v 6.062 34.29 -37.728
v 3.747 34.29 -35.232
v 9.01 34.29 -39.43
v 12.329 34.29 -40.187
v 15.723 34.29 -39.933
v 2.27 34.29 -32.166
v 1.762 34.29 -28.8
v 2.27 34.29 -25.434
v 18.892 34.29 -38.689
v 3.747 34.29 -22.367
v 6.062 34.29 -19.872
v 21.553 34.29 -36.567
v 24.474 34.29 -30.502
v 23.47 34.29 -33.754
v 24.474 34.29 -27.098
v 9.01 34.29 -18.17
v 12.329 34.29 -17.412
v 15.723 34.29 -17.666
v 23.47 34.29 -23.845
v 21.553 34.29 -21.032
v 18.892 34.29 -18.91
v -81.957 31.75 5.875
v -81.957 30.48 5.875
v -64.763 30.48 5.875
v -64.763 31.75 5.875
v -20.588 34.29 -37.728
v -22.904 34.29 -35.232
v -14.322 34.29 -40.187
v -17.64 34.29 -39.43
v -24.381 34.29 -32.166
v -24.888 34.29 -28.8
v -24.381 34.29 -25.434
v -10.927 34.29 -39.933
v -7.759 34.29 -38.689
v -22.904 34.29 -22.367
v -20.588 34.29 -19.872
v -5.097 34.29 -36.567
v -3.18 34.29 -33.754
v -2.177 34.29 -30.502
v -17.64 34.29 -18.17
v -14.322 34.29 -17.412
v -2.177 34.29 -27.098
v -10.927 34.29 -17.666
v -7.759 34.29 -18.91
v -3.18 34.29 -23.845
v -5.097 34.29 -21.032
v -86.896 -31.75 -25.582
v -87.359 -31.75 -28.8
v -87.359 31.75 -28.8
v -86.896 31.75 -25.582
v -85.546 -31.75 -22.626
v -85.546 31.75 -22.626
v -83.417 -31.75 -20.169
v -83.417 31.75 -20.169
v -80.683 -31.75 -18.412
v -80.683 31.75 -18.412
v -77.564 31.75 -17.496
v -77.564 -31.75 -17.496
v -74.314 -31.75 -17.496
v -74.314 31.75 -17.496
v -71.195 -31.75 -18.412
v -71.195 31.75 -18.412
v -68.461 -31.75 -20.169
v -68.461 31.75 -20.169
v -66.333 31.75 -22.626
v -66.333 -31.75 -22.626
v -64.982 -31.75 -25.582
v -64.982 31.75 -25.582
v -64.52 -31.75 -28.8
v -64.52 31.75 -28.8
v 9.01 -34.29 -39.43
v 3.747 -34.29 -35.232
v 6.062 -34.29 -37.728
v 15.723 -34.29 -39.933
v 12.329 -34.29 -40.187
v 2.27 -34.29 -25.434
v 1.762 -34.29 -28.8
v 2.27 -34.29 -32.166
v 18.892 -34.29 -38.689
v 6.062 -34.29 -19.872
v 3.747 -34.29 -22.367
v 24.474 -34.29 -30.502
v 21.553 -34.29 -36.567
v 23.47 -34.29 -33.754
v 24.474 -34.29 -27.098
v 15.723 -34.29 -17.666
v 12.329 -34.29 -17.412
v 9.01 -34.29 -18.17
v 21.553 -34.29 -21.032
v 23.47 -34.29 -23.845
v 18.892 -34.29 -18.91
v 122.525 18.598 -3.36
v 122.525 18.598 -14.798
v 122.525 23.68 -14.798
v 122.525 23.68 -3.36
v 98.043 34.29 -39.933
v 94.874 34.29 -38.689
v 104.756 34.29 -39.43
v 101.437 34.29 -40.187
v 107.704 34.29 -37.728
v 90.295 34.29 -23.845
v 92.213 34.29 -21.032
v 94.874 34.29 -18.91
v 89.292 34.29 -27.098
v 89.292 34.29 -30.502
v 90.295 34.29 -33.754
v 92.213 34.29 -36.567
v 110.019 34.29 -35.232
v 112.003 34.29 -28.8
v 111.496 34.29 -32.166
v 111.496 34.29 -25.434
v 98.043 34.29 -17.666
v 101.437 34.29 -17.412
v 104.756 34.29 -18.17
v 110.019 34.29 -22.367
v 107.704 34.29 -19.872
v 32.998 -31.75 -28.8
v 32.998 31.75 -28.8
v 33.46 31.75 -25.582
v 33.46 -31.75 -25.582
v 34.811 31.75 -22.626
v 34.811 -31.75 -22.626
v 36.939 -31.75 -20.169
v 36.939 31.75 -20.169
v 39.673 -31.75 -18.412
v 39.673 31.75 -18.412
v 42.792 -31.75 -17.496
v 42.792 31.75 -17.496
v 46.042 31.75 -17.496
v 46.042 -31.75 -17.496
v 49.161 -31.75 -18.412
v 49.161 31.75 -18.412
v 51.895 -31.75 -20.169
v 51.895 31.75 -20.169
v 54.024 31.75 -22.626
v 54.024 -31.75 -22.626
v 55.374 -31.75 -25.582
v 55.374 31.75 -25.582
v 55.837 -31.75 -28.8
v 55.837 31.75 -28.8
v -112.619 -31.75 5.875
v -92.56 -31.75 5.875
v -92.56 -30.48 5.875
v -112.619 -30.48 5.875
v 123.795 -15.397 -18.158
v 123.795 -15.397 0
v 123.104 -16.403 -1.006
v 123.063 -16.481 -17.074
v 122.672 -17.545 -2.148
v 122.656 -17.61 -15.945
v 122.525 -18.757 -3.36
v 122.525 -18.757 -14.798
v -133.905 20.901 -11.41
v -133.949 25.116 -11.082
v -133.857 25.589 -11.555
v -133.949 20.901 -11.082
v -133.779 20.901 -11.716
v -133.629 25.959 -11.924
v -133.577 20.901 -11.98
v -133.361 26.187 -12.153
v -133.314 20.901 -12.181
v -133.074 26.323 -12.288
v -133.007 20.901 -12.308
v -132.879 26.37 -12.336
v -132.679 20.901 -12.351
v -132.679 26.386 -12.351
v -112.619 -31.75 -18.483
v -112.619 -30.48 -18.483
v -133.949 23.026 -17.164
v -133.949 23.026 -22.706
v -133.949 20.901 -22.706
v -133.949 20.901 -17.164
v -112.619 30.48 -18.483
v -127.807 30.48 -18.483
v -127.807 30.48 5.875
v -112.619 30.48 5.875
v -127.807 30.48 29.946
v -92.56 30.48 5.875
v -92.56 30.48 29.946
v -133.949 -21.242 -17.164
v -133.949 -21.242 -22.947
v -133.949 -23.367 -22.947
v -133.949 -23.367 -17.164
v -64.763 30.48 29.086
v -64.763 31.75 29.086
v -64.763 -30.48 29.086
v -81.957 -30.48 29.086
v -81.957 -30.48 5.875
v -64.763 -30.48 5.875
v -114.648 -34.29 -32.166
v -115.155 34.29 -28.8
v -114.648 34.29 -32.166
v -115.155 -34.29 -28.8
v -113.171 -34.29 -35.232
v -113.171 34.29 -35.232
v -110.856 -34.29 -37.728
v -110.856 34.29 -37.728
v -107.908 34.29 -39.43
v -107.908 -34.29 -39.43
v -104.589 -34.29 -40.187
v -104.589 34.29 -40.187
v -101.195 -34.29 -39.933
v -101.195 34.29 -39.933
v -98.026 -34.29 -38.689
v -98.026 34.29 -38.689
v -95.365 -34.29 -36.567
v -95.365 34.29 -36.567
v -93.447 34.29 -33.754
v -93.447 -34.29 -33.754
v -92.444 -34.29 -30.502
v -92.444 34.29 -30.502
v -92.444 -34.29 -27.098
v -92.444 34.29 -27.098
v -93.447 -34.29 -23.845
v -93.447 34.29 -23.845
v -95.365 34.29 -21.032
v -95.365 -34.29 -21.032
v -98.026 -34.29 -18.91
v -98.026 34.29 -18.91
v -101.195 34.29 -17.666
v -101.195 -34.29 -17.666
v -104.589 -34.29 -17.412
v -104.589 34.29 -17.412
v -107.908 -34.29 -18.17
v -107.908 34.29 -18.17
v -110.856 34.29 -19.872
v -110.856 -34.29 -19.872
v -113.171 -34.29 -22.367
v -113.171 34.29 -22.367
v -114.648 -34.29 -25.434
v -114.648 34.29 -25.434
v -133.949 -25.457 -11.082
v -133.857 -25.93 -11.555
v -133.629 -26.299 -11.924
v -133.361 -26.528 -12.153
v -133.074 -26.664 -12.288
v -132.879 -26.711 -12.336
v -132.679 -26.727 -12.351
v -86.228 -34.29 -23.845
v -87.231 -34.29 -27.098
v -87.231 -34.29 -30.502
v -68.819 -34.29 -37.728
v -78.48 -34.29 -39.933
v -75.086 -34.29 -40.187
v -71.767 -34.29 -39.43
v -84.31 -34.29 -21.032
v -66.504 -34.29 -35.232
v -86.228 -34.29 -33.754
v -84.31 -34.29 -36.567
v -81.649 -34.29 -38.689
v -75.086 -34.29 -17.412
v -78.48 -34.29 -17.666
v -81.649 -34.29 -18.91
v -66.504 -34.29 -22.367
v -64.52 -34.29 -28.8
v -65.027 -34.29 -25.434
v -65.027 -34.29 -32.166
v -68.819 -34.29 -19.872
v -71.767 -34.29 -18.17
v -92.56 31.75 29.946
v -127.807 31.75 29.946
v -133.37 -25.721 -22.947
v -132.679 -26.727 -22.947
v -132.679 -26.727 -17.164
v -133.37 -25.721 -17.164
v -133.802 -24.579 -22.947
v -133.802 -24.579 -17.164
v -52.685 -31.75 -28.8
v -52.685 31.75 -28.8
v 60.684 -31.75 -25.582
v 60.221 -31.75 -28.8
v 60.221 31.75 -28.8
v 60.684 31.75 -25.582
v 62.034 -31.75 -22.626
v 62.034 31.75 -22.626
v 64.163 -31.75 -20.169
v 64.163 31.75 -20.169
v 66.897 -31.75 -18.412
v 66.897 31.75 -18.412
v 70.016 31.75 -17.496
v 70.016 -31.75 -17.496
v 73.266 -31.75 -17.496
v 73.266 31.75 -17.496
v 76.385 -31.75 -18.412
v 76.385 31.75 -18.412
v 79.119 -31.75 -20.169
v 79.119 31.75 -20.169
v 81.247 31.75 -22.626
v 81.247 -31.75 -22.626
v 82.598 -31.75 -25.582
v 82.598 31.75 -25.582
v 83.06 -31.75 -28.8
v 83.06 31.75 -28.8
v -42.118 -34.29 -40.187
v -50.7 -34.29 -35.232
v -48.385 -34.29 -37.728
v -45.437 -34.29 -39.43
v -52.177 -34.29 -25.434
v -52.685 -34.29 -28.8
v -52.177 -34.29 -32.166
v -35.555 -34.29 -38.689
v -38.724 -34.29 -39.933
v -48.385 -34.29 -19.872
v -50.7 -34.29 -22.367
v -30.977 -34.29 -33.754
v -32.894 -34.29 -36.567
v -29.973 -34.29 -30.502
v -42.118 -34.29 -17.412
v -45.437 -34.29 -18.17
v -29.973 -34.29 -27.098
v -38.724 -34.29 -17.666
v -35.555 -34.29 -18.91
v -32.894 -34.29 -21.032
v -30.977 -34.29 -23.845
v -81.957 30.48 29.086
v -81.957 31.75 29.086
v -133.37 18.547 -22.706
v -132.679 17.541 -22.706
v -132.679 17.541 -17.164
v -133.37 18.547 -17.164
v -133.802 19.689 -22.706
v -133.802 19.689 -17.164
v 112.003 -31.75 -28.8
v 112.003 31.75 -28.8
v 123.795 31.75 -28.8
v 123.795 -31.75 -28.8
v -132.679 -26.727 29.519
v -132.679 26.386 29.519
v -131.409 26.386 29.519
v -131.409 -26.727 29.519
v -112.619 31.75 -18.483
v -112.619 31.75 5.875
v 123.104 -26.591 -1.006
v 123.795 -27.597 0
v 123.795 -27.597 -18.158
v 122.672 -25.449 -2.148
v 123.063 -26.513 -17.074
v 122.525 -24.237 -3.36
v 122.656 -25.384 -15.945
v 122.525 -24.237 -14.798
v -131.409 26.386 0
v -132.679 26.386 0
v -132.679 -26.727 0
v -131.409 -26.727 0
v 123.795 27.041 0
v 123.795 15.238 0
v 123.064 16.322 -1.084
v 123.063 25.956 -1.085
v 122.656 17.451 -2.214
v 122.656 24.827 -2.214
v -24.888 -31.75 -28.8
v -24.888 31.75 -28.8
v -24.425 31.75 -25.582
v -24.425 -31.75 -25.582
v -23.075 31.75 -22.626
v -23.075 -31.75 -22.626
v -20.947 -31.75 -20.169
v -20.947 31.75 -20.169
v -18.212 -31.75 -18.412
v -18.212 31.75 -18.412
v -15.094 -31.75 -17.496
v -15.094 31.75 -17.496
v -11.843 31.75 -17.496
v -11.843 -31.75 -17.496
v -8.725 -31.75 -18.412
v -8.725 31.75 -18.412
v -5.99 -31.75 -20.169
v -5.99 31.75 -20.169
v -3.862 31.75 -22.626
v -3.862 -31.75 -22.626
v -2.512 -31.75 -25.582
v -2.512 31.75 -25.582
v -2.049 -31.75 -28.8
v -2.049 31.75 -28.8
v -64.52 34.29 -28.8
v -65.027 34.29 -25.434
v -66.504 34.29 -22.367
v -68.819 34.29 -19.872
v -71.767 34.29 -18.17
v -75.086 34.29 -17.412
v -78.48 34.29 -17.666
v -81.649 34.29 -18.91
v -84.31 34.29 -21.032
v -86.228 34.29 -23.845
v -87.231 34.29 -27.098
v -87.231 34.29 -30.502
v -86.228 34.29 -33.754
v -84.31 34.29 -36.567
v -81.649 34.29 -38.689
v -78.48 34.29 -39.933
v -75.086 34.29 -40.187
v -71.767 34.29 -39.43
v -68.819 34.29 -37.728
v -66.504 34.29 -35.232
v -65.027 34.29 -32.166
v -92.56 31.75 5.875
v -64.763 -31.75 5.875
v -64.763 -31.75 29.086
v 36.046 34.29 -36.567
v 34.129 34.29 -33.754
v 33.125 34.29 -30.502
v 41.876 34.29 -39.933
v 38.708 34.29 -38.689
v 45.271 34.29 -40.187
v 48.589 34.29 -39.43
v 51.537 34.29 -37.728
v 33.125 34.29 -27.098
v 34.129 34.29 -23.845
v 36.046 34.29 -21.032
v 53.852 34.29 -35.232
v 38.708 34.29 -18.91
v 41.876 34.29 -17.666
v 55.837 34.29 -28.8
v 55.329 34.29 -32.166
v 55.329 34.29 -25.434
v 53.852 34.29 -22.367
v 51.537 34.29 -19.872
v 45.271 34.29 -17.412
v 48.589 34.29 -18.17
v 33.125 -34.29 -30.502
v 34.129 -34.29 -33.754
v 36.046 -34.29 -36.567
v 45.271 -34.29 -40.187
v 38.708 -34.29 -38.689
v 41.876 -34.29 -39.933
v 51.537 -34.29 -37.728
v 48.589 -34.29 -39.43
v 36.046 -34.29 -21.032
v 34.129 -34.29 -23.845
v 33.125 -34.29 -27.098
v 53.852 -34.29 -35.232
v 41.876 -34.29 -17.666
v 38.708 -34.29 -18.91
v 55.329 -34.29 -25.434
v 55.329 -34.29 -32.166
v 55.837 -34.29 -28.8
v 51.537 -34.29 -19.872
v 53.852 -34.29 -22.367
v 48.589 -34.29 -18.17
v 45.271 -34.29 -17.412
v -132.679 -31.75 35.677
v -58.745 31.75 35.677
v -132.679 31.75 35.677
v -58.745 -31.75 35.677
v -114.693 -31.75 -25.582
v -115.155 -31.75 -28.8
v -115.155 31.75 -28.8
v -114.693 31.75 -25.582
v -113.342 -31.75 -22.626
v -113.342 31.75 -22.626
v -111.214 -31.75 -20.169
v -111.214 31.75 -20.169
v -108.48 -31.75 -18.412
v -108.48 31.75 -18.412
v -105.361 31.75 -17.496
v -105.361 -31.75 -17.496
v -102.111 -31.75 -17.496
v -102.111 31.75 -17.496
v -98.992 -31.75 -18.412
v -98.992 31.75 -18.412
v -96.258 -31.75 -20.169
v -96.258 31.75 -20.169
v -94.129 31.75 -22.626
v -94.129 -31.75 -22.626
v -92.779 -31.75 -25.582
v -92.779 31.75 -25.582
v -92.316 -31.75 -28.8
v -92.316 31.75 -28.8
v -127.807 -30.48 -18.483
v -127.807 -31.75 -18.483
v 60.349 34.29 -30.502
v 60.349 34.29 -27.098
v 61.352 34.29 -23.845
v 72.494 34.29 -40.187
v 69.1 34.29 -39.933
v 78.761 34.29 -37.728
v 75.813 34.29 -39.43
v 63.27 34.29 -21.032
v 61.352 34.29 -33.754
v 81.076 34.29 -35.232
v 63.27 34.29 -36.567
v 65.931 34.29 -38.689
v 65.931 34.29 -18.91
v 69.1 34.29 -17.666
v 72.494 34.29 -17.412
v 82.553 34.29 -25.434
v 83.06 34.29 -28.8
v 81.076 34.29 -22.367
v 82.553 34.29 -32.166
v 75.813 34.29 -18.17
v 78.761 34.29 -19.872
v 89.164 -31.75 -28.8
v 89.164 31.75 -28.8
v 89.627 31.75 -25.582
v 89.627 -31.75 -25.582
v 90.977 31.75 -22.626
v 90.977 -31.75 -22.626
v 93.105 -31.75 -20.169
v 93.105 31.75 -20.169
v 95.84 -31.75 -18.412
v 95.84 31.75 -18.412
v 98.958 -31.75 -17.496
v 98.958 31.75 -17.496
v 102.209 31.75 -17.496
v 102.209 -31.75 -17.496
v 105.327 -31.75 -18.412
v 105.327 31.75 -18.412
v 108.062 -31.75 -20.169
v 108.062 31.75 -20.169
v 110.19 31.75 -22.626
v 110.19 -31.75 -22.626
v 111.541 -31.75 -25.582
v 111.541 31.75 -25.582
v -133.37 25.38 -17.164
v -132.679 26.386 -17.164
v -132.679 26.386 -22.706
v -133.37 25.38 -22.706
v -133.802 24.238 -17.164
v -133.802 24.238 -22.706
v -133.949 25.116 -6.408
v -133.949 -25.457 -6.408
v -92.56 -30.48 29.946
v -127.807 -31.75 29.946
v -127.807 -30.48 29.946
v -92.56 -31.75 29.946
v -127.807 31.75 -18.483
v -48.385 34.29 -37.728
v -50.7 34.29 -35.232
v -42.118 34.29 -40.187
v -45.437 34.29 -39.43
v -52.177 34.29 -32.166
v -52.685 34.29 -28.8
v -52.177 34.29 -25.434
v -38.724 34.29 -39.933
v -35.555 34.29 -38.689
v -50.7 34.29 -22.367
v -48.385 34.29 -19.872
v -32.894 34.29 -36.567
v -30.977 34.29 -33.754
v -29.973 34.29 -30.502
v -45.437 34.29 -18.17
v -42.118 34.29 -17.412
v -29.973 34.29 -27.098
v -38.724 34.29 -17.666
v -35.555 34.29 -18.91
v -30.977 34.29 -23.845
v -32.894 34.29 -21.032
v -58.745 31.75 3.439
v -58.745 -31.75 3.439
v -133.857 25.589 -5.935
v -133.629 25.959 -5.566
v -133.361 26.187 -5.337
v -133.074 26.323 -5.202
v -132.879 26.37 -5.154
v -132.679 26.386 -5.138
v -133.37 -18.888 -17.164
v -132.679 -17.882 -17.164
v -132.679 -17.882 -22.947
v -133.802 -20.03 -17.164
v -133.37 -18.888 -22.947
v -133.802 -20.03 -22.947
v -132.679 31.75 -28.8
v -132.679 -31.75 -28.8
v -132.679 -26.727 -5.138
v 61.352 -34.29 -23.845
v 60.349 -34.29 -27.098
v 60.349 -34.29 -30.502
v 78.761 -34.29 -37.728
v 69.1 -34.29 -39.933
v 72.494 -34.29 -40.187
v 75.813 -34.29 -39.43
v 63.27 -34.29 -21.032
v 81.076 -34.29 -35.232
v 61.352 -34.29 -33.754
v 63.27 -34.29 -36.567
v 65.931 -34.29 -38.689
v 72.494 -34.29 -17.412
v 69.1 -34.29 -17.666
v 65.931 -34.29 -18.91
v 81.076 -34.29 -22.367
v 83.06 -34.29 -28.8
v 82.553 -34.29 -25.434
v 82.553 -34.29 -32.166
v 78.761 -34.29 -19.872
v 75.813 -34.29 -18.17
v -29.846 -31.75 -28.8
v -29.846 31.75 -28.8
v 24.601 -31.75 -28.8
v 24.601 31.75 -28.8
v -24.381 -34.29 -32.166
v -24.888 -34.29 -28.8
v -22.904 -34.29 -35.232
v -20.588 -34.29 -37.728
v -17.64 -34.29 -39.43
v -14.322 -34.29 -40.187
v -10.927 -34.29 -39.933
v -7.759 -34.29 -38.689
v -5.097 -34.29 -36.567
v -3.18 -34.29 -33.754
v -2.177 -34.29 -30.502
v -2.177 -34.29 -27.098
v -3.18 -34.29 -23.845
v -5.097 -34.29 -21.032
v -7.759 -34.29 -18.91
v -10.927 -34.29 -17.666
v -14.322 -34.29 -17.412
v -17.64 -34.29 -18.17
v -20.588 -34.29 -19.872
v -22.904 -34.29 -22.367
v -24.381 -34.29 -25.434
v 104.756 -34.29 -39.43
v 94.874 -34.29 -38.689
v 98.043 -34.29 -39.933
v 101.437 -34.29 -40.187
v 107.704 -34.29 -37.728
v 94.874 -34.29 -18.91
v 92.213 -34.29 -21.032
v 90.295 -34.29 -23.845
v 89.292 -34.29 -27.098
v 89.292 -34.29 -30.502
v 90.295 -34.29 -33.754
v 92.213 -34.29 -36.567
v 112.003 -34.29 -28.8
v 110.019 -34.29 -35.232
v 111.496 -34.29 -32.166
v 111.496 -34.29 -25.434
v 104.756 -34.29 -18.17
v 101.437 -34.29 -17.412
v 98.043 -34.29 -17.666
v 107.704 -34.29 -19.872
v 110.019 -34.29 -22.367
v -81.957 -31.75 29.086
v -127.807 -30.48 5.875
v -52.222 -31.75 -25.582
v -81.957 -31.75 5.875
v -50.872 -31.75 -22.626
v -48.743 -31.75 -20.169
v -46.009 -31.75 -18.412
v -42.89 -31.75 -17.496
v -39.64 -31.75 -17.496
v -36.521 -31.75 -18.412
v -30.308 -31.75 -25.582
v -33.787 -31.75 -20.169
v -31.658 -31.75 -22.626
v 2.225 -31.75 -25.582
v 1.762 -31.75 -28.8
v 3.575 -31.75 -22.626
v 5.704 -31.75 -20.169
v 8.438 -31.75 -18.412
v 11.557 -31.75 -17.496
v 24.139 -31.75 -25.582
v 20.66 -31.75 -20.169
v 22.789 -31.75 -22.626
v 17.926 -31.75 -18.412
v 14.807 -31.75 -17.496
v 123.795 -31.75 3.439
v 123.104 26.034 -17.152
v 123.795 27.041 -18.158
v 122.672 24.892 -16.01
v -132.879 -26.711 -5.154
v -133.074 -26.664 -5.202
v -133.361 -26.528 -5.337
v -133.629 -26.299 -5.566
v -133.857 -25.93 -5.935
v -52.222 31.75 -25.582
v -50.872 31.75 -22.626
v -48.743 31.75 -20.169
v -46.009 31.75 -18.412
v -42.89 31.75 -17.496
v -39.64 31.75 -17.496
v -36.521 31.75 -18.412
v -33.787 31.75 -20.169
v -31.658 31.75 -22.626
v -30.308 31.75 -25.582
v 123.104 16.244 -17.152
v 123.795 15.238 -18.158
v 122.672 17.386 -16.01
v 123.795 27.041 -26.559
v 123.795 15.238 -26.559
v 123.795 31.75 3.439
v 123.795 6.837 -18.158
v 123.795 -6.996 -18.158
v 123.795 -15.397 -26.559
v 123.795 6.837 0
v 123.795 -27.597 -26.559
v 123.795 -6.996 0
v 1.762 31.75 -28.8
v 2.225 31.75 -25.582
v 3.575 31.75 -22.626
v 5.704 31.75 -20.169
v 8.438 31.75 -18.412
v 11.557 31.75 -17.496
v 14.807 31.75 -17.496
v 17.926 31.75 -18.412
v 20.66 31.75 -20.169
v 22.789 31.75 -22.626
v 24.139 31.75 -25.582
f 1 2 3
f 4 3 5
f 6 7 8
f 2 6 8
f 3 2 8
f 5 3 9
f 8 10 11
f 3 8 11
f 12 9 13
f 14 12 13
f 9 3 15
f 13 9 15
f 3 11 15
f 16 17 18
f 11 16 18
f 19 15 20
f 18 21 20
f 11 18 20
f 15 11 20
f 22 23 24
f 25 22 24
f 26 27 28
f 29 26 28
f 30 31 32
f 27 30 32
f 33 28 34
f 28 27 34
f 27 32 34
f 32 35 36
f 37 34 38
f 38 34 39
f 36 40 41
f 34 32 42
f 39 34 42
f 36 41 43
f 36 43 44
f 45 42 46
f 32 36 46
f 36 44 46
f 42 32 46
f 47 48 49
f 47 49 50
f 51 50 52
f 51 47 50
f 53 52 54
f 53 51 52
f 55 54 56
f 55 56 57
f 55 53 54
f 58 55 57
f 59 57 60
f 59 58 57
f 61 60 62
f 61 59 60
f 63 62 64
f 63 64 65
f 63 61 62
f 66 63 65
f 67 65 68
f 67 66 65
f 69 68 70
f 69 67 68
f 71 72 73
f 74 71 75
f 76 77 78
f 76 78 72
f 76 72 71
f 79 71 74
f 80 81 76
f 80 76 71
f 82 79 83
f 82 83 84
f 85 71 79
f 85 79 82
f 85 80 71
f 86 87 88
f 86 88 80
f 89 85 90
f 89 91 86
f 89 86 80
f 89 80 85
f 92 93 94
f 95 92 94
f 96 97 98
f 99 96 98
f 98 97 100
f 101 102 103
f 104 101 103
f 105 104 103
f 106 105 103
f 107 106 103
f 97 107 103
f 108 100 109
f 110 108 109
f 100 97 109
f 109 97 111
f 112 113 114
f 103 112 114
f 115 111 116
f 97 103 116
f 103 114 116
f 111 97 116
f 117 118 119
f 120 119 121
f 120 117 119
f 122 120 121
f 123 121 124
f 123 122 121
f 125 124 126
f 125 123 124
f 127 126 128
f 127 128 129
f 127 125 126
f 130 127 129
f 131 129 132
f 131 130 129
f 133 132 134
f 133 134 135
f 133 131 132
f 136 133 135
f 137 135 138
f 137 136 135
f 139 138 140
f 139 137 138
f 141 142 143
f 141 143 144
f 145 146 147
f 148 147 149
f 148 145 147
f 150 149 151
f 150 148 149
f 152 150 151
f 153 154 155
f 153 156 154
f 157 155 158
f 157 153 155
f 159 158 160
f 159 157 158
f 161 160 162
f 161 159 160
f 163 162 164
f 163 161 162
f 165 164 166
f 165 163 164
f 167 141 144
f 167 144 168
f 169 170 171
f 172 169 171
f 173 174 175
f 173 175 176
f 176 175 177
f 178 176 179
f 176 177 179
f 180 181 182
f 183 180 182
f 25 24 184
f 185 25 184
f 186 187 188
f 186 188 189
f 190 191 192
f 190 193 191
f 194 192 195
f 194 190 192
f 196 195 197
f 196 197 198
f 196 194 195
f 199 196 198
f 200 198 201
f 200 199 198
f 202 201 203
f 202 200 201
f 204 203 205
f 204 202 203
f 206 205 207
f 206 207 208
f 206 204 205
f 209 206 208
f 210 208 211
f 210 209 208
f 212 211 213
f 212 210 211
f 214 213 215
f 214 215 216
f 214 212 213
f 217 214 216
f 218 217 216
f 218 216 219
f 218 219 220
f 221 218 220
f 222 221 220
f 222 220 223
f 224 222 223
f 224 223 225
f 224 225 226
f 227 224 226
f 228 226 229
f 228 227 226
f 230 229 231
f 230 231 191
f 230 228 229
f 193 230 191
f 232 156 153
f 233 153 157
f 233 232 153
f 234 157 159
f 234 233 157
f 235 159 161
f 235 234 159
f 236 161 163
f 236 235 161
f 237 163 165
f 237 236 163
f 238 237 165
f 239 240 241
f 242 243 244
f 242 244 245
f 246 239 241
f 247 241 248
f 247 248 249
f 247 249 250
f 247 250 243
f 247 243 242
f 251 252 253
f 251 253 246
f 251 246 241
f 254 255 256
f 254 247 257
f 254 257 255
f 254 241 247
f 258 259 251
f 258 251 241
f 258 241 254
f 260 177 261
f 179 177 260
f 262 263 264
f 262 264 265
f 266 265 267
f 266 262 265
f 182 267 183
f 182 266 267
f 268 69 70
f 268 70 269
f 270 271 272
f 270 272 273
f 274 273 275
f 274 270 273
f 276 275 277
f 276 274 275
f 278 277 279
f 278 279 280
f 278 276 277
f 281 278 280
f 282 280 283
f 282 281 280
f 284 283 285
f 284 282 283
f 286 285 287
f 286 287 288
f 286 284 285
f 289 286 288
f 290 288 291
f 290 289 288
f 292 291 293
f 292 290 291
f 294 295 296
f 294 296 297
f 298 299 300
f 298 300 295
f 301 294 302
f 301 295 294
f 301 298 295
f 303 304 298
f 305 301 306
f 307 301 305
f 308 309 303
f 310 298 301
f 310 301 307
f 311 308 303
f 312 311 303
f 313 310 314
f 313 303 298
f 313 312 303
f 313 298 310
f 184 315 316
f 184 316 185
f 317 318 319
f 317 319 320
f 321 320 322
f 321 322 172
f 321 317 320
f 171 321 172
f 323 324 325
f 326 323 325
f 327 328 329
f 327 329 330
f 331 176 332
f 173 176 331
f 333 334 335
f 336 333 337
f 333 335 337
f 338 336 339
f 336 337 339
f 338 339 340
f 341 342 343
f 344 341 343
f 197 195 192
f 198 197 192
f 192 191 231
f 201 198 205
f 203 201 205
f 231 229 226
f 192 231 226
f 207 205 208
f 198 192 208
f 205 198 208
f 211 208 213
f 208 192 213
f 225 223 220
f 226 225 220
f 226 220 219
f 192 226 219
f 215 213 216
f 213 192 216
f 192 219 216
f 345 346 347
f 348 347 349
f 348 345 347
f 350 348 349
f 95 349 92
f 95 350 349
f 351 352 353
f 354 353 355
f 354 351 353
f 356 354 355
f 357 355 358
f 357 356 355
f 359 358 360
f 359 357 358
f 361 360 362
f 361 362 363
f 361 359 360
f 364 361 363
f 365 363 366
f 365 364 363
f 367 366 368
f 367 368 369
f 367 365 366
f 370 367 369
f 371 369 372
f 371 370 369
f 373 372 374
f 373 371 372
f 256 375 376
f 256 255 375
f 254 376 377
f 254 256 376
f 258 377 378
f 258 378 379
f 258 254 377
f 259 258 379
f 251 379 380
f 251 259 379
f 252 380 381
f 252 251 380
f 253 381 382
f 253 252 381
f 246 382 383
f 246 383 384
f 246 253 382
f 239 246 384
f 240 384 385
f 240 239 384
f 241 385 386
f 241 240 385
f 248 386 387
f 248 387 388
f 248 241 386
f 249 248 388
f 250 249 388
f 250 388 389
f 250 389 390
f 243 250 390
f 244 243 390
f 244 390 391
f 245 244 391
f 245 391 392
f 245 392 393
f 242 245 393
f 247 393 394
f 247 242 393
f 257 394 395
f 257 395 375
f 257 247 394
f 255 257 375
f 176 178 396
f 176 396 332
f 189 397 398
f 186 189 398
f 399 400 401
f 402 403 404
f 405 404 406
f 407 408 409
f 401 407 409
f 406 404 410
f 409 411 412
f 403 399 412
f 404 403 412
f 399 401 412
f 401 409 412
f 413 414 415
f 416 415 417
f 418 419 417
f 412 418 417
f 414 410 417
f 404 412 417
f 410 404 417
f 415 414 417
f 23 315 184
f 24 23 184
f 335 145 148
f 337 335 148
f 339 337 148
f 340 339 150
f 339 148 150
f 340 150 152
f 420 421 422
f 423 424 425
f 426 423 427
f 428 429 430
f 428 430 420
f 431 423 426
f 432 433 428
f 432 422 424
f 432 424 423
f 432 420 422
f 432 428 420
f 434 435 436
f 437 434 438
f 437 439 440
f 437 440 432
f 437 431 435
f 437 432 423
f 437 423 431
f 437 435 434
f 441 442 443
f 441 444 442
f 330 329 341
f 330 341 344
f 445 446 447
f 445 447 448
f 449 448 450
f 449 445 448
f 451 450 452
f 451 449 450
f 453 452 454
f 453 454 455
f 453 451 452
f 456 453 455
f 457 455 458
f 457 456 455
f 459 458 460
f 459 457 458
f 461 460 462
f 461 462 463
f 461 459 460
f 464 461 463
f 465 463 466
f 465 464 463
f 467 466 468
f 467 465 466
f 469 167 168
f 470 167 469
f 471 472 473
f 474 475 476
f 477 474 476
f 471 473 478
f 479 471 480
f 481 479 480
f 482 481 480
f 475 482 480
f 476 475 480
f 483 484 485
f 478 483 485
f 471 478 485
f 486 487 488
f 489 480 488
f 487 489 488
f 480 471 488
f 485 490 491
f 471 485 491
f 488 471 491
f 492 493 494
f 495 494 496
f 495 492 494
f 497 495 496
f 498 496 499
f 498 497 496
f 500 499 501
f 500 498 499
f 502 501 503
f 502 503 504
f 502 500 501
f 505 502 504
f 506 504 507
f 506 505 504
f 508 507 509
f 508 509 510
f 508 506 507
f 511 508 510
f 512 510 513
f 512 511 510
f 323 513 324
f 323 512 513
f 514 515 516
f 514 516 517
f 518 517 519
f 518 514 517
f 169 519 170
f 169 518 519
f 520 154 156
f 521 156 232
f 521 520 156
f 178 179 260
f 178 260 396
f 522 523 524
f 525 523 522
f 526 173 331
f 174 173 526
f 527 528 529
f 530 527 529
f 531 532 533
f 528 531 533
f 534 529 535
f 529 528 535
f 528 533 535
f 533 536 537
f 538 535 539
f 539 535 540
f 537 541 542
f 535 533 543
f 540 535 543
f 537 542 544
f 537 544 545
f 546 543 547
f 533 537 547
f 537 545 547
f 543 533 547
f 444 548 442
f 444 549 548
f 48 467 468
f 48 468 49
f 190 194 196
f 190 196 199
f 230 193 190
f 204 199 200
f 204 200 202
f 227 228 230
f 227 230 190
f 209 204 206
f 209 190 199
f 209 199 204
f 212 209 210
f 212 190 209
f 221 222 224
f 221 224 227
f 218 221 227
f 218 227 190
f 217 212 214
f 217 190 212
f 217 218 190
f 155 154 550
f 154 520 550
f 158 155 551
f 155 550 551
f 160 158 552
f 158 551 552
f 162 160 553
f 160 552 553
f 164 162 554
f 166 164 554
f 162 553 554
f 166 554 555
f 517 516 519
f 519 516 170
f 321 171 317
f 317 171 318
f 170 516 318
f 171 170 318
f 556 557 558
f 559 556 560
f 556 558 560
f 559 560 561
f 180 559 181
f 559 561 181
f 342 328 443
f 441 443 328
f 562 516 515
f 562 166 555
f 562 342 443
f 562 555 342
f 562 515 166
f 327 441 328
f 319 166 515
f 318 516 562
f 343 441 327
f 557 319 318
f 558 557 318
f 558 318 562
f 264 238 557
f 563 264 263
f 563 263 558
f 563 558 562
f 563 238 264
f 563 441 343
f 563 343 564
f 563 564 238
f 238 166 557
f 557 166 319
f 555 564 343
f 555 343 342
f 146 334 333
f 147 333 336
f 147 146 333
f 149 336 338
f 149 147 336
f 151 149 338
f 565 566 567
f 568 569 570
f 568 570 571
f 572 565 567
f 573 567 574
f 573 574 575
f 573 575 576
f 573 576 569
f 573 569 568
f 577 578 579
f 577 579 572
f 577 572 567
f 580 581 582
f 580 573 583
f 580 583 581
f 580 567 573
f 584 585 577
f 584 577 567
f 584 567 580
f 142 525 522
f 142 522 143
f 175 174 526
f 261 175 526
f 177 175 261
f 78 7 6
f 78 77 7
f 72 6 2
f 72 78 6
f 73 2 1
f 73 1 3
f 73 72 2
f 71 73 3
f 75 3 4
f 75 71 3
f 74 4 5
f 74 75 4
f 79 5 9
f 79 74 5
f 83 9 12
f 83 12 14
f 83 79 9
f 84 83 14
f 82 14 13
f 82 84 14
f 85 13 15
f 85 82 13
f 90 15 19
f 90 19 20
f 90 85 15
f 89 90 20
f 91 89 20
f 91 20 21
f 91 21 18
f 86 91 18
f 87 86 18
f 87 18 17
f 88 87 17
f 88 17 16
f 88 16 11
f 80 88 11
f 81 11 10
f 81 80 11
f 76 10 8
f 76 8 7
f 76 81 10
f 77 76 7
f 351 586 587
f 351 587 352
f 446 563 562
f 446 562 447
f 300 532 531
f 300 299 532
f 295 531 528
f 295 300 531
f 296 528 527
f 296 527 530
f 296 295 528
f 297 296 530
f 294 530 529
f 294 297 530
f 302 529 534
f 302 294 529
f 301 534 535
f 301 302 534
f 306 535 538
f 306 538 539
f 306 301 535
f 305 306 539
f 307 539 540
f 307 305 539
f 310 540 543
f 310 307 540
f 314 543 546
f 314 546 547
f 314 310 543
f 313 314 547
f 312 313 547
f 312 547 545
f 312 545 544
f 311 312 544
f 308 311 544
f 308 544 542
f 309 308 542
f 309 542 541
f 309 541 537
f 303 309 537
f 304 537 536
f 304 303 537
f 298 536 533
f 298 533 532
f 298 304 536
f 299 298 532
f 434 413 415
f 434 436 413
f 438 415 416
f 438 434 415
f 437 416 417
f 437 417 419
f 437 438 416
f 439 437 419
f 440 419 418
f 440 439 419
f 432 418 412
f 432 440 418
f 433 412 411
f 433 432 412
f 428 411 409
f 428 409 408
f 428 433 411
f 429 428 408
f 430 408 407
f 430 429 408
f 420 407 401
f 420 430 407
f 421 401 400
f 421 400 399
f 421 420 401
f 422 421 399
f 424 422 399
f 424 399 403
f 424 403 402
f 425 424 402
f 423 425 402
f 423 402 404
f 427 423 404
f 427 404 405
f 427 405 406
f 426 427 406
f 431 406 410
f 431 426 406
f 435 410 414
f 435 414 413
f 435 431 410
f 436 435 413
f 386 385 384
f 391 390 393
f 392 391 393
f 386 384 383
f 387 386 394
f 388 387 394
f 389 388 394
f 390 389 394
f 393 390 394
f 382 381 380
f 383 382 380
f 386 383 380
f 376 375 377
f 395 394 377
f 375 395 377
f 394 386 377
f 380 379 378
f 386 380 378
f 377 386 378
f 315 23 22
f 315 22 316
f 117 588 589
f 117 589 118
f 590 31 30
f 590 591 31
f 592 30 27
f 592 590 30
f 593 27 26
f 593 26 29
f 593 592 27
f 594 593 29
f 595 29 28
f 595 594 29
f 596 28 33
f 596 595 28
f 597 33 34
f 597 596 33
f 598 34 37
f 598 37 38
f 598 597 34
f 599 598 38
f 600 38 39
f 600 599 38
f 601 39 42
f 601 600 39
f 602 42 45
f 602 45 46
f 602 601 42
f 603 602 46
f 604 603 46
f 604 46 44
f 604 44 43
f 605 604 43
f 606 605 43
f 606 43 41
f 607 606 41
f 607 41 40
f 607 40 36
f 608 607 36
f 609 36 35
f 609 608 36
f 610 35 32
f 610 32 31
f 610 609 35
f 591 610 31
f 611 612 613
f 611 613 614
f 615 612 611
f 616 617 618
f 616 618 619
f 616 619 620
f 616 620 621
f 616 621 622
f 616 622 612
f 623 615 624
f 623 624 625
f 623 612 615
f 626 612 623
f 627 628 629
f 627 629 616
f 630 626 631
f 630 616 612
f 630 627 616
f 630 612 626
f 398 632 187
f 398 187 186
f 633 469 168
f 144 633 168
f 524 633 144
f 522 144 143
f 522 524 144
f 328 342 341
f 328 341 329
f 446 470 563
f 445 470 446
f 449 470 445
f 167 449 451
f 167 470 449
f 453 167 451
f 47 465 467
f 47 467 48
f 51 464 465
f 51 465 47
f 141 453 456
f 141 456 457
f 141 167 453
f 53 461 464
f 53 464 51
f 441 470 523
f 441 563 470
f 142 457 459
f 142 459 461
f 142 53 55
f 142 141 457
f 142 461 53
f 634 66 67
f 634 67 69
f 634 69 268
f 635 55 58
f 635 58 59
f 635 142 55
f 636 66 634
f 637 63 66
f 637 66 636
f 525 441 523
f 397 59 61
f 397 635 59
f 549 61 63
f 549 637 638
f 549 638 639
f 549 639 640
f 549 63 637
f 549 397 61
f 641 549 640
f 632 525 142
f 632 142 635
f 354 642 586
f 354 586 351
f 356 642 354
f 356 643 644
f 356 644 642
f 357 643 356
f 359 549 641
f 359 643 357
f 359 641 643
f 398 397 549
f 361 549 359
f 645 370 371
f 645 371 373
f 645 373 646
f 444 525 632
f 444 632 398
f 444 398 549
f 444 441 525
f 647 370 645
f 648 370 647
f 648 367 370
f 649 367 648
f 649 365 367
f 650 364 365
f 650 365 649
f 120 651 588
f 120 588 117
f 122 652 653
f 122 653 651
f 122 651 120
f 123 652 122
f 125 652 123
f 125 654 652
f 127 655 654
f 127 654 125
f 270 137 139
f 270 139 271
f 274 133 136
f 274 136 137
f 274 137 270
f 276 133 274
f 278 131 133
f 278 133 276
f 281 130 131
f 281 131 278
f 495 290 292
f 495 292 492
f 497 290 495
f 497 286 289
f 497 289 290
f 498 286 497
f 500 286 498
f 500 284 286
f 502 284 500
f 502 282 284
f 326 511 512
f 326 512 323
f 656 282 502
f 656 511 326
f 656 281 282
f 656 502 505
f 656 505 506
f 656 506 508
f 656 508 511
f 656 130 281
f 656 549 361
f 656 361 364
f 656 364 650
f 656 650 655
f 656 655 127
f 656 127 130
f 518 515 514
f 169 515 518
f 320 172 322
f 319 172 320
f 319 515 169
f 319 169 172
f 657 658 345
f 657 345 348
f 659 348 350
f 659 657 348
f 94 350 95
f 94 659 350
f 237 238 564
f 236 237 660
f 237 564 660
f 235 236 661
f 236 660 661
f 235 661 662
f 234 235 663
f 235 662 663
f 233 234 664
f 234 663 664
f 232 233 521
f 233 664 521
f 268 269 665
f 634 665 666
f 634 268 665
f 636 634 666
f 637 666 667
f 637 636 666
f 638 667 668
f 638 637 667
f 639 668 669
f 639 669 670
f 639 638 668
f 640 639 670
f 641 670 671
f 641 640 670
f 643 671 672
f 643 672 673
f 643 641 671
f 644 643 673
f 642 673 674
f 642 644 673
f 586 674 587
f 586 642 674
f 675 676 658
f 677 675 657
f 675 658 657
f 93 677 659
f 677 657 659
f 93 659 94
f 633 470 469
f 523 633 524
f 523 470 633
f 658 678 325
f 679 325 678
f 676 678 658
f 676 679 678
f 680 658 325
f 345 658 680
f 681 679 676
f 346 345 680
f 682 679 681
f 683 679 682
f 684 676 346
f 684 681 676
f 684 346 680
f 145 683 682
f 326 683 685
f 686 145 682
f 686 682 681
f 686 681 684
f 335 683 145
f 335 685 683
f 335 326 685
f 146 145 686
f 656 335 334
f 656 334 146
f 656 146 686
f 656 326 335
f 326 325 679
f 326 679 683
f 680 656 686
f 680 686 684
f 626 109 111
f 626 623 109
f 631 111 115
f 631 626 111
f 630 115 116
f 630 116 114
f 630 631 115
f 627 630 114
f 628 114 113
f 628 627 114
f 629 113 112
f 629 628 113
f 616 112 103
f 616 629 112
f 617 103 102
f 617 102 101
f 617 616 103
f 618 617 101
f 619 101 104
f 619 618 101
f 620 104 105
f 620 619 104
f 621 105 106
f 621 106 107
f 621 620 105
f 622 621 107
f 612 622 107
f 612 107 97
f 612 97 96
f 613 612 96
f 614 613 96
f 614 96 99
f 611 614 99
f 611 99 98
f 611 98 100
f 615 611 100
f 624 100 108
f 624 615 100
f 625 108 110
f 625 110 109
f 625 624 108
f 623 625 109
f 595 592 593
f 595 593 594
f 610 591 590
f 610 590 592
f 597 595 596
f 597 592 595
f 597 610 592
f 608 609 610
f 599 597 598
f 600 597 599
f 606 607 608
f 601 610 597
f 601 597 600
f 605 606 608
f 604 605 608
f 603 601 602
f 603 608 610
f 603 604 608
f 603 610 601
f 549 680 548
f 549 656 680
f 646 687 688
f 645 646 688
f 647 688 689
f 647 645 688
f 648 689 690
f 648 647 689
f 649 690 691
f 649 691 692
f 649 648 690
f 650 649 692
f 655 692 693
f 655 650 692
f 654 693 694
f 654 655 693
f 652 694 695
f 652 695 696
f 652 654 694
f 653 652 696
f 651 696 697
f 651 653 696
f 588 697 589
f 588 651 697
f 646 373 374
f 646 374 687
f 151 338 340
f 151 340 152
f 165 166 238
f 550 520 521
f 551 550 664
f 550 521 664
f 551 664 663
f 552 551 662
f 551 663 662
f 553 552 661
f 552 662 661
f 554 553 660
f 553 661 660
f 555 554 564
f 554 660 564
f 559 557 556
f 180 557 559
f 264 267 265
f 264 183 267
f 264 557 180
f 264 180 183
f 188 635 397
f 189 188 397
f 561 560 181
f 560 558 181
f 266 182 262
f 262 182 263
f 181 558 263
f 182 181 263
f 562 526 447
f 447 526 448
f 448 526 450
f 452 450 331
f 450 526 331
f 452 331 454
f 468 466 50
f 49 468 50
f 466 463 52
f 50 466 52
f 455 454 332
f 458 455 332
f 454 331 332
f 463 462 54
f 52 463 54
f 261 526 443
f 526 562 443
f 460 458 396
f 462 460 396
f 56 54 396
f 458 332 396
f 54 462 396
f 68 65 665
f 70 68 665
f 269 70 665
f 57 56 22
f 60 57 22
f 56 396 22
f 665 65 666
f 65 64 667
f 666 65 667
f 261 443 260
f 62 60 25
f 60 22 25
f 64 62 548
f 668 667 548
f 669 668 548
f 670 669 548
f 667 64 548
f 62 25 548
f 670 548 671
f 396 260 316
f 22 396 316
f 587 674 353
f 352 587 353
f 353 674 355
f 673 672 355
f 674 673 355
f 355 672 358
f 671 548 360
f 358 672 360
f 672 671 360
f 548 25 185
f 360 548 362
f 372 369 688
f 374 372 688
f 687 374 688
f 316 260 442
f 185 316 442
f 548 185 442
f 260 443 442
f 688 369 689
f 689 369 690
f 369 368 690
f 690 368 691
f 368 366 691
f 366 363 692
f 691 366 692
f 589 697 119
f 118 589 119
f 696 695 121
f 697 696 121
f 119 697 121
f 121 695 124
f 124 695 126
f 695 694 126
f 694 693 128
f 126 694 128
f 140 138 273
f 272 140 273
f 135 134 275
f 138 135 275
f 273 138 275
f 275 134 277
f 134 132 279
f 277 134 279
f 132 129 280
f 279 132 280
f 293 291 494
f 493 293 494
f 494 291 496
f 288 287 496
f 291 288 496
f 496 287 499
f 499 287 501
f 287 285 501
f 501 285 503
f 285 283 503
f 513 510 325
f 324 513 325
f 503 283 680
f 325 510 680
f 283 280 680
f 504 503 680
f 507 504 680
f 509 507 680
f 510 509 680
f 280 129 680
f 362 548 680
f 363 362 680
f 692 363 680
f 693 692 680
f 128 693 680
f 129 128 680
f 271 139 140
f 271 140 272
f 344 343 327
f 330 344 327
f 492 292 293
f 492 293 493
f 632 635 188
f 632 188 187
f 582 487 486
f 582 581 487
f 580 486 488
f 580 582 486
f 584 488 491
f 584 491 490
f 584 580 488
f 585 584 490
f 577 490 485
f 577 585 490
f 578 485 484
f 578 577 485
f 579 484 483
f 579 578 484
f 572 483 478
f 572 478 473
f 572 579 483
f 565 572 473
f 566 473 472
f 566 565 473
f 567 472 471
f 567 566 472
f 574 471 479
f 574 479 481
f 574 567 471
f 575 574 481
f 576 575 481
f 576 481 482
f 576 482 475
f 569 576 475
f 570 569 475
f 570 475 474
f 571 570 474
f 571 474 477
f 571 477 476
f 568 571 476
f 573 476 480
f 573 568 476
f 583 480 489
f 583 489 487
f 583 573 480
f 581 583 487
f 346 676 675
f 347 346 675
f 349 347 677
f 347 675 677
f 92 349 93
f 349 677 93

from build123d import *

# Parameters (mm, degrees)
F0_W         = 17.1937867999
F0_H         = 23.2116123661
F1_DEPTH     = 31.75
F2_W         = 8.8453050703
F2_H         = 5.5423062295
F2_H_2       = 5.7832766324
F2_W_2       = 53.1131848693
F2_H_3       = 7.2131637233
F3_DEPTH     = 1.27
F2_H_4       = 29.5187777961
F4_DEPTH     = 1.27
F5_T1_DEPTH  = 14.1835370451
F5_T6_DEPTH  = 22.3428270547
F5_T11_DEPTH = 22.3428270547
F6_R         = 1.26999
F7_DEPTH     = 34.29
F0_W_2       = 15.1878371835
F0_H_2       = 24.3578637019
F8_DEPTH     = 30.48
F9_W         = 12.2006889433
F9_H         = 18.1582923979
F9_W_2       = 11.8028419092
F10_DEPTH    = 1.27
F11_T1_DEPTH = 26.5585528105
F11_T3_DEPTH = 20.6009493559
F11_T5_DEPTH = 20.2031023219


# Not quite as in the source:
# - a fillet or chamfer that OpenCascade refuses, or shapes differently, is made with other operations: its cross-section is extruded or revolved along the edge and cut away or added
# - a fillet or chamfer is up to 0.001 mm smaller than in the source, because OpenCascade refuses the exact size


with BuildPart() as f1:
    # F0 (on Front) → F1 (new body, symmetric)
    with BuildSketch(Plane.XZ):
        with BuildLine():
            Line((-58.7454400957, 35.6771033257), (-132.6787173748, 35.6771033257))
            Line((-132.6787173748, 35.6771033257), (-132.6787173748, -28.7995953113))
            Line((-132.6787173748, -28.7995953113), (-115.1552961537, -28.7995953113))
            ThreePointArc((-115.1552961537, -28.7995953113), (-103.7358418107, -17.3801409683), (-92.3163874677, -28.7995953113))
            Line((-92.3163874677, -28.7995953113), (-87.3586775133, -28.7995953113))
            ThreePointArc((-87.3586775133, -28.7995953113), (-75.9392231703, -17.3801409683), (-64.5197688273, -28.7995953113))
            Line((-64.5197688273, -28.7995953113), (-58.7454400957, -28.7995953113))
            Line((-58.7454400957, -28.7995953113), (-58.7454400957, 3.4387540072))
            Line((-58.7454400957, 3.4387540072), (-58.7454400957, 35.6771033257))
        make_face()
        Polygon((-127.8071403503, 5.8745397255), (-127.8071403503, 29.9458410591), (-92.5598889589, 29.9458410591), (-92.5598889589, 5.8745397255), (-112.6193031669, 5.8745397255), (-112.6193031669, -18.4833239764), (-127.8071403503, -18.4833239764), align=None, mode=Mode.SUBTRACT)
        with Locations((-73.3601562679, 17.4803459086)):
            Rectangle(F0_W, F0_H, mode=Mode.SUBTRACT)
        with BuildLine():
            Line((123.7952634692, 3.4387540072), (-58.7454400957, 3.4387540072))
            Line((-58.7454400957, 3.4387540072), (-58.7454400957, -28.7995953113))
            Line((-58.7454400957, -28.7995953113), (-52.6845434078, -28.7995953113))
            ThreePointArc((-52.6845434078, -28.7995953113), (-41.2650890648, -17.3801409683), (-29.8456347218, -28.7995953113))
            Line((-29.8456347218, -28.7995953113), (-24.8879229048, -28.7995953113))
            ThreePointArc((-24.8879229048, -28.7995953113), (-13.4684685618, -17.3801409683), (-2.0490142188, -28.7995953113))
            Line((-2.0490142188, -28.7995953113), (1.7624453312, -28.7995953113))
            ThreePointArc((1.7624453312, -28.7995953113), (13.1818996742, -17.3801409683), (24.6013540172, -28.7995953113))
            Line((24.6013540172, -28.7995953113), (32.9978263608, -28.7995953113))
            ThreePointArc((32.9978263608, -28.7995953113), (44.4172807038, -17.3801409683), (55.8367350468, -28.7995953113))
            Line((55.8367350468, -28.7995953113), (60.2213128141, -28.7995953113))
            ThreePointArc((60.2213128141, -28.7995953113), (71.6407671571, -17.3801409683), (83.0602215001, -28.7995953113))
            Line((83.0602215001, -28.7995953113), (89.1641883782, -28.7995953113))
            ThreePointArc((89.1641883782, -28.7995953113), (100.5836427212, -17.3801409683), (112.0030970642, -28.7995953113))
            Line((112.0030970642, -28.7995953113), (123.7952634692, -28.7995953113))
            Line((123.7952634692, -28.7995953113), (123.7952634692, 3.4387540072))
        make_face()
    extrude(amount=F1_DEPTH, both=True)

    # F2 (on face) → F3 (join)
    with BuildSketch(Plane(origin=(-132.6787173748, 0, 0), x_dir=(0, -1, 0), z_dir=(-1, 0, 0))):
        with Locations((-21.9635469839, -19.9353238568)):
            Rectangle(F2_W, F2_H)
        with Locations((22.3043328151, -20.0558090582)):
            Rectangle(F2_W, F2_H_2)
        with Locations((0.1703929156, -8.744909234)):
            Rectangle(F2_W_2, F2_H_3)
    extrude(amount=F3_DEPTH)

    # F2 (on face) → F4 (cut)
    with BuildSketch(Plane(origin=(-132.6787173748, 0, 0), x_dir=(0, -1, 0), z_dir=(-1, 0, 0))):
        with Locations((0.1703929156, 14.759388898)):
            Rectangle(F2_W_2, F2_H_4)
    extrude(amount=-F4_DEPTH, mode=Mode.SUBTRACT)

    # F5: fillet of radius 5.08 on 4 edges, made by hand

    # F5_s2 → F5_t1 (cut)
    with BuildSketch(Plane.XY.offset(-31.3477077871)):
        with BuildLine():
            ThreePointArc((-132.6787173748, -26.7269853503), (-133.620622256, -25.1629324094), (-133.9487173748, -23.3668811852))
            Line((-133.9487173748, -23.3668811852), (-133.9487173748, -26.7269853503))
            Line((-133.9487173748, -26.7269853503), (-132.6787173748, -26.7269853503))
        make_face()
        with BuildLine():
            ThreePointArc((-132.6787173748, -17.88168028), (-133.620622256, -19.4457332208), (-133.9487173748, -21.241784445))
            Line((-133.9487173748, -21.241784445), (-133.9487173748, -17.88168028))
            Line((-133.9487173748, -17.88168028), (-132.6787173748, -17.88168028))
        make_face()
    extrude(amount=F5_T1_DEPTH, mode=Mode.SUBTRACT)


with BuildPart() as f5_tool4:
    # F5_s5 → F5_t6 (new body)
    with BuildSketch(Plane.XY.offset(-31.1067373841)):
        with BuildLine():
            ThreePointArc((-132.6787173748, 17.5408944488), (-133.620622256, 19.1049473896), (-133.9487173748, 20.9009986138))
            Line((-133.9487173748, 20.9009986138), (-133.9487173748, 17.5408944488))
            Line((-133.9487173748, 17.5408944488), (-132.6787173748, 17.5408944488))
        make_face()
    extrude(amount=F5_T6_DEPTH)

    split(bisect_by=Plane.XY.offset(-12.3514910956), keep=Keep.BOTTOM)


with BuildPart() as f1_1:
    add(f1.part)

    # F5_t3: cut F5_tool4
    add(f5_tool4.part, mode=Mode.SUBTRACT)


with BuildPart() as f5_tool9:
    # F5_s10 → F5_t11 (new body)
    with BuildSketch(Plane.XY.offset(-8.7639103294)):
        with BuildLine():
            ThreePointArc((-132.6787173748, 26.386199519), (-133.620622256, 24.8221465782), (-133.9487173748, 23.026095354))
            Line((-133.9487173748, 23.026095354), (-133.9487173748, 26.386199519))
            Line((-133.9487173748, 26.386199519), (-132.6787173748, 26.386199519))
        make_face()
    extrude(amount=-F5_T11_DEPTH)

    split(bisect_by=Plane.XY.offset(-12.3514910956), keep=Keep.BOTTOM)


with BuildPart() as f1_2:
    add(f1_1.part)

    # F5_t8: cut F5_tool9
    add(f5_tool9.part, mode=Mode.SUBTRACT)

    # F6 (radius 1.27 in the source; OpenCascade refuses exactly that, so slightly less here)
    f6_edges = [f1_2.edges().sort_by_distance(p)[0] for p in [
        (-133.948717, -0.170393, -12.351491),
        (-133.948717, 26.3862, -8.744909),
        (-133.948717, -0.170393, -5.138327),
        (-133.948717, -26.726985, -8.744909),
    ]]
    fillet(f6_edges, radius=F6_R)

    # F0 (on Front) → F8 (join, symmetric)
    with BuildSketch(Plane.XZ):
        Polygon((-92.5598889589, 29.9458410591), (-127.8071403503, 29.9458410591), (-127.8071403503, 5.8745397255), (-112.6193031669, 5.8745397255), (-92.5598889589, 5.8745397255), align=None)
        with Locations((-120.2132217586, -6.3043921255)):
            Rectangle(F0_W_2, F0_H_2)
        with Locations((-73.3601562679, 17.4803459086)):
            Rectangle(F0_W, F0_H)
    extrude(amount=F8_DEPTH, both=True)

    # F9 (on face) → F10 (cut)
    with BuildSketch(Plane.YZ.offset(123.7952634692)):
        with Locations((-21.4970195666, -9.0791461989)):
            Rectangle(F9_W, F9_H)
        with Locations((21.1390811019, -9.0791461989)):
            Rectangle(F9_W_2, F9_H)
    extrude(amount=-F10_DEPTH, mode=Mode.SUBTRACT)

    # F11: fillet of radius 5.08 on 8 edges, made by hand

    # F11_s2 → F11_t1 (join)
    with BuildSketch(Plane.XY.offset(-26.5585528105)):
        with BuildLine():
            ThreePointArc((123.7952634692, -27.5973640382), (122.853358588, -26.0333110974), (122.5252634692, -24.2372598732))
            Line((122.5252634692, -24.2372598732), (122.5252634692, -27.5973640382))
            Line((122.5252634692, -27.5973640382), (123.7952634692, -27.5973640382))
        make_face()
        with BuildLine():
            ThreePointArc((123.7952634692, -15.396675095), (122.853358588, -16.9607280358), (122.5252634692, -18.75677926))
            Line((122.5252634692, -18.75677926), (122.5252634692, -15.396675095))
            Line((122.5252634692, -15.396675095), (123.7952634692, -15.396675095))
        make_face()
        with BuildLine():
            ThreePointArc((123.7952634692, 15.2376601472), (122.853358588, 16.8017130881), (122.5252634692, 18.5977643123))
            Line((122.5252634692, 18.5977643123), (122.5252634692, 15.2376601472))
            Line((122.5252634692, 15.2376601472), (123.7952634692, 15.2376601472))
        make_face()
        with BuildLine():
            ThreePointArc((123.7952634692, 27.0405020565), (122.853358588, 25.4764491156), (122.5252634692, 23.6803978914))
            Line((122.5252634692, 23.6803978914), (122.5252634692, 27.0405020565))
            Line((122.5252634692, 27.0405020565), (123.7952634692, 27.0405020565))
        make_face()
    extrude(amount=F11_T1_DEPTH)

    # F11_s4 → F11_t3 (join)
    with BuildSketch(Plane.XZ.offset(6.9964146823)):
        with BuildLine():
            ThreePointArc((123.7952634692, 0), (122.853358588, -1.5640529408), (122.5252634692, -3.3601041651))
            Line((122.5252634692, -3.3601041651), (122.5252634692, 0))
            Line((122.5252634692, 0), (123.7952634692, 0))
        make_face()
        with BuildLine():
            ThreePointArc((123.7952634692, -18.1582923979), (122.853358588, -16.594239457), (122.5252634692, -14.7981882328))
            Line((122.5252634692, -14.7981882328), (122.5252634692, -18.1582923979))
            Line((122.5252634692, -18.1582923979), (123.7952634692, -18.1582923979))
        make_face()
    extrude(amount=F11_T3_DEPTH)

    # F11_s6 → F11_t5 (join)
    with BuildSketch(Plane.XZ.offset(-27.0405020565)):
        with BuildLine():
            ThreePointArc((123.7952634692, 0), (122.853358588, -1.5640529408), (122.5252634692, -3.3601041651))
            Line((122.5252634692, -3.3601041651), (122.5252634692, 0))
            Line((122.5252634692, 0), (123.7952634692, 0))
        make_face()
        with BuildLine():
            ThreePointArc((123.7952634692, -18.1582923979), (122.853358588, -16.594239457), (122.5252634692, -14.7981882328))
            Line((122.5252634692, -14.7981882328), (122.5252634692, -18.1582923979))
            Line((122.5252634692, -18.1582923979), (123.7952634692, -18.1582923979))
        make_face()
    extrude(amount=F11_T5_DEPTH)


with BuildPart() as f7:
    # F0 (on Front) → F7 (new body, symmetric)
    with BuildSketch(Plane.XZ):
        with BuildLine():
            ThreePointArc((-92.3163874677, -28.7995953113), (-103.7358418107, -17.3801409683), (-115.1552961537, -28.7995953113))
            ThreePointArc((-115.1552961537, -28.7995953113), (-103.7358418107, -40.2190496543), (-92.3163874677, -28.7995953113))
        make_face()
    extrude(amount=F7_DEPTH, both=True)


with BuildPart() as f7b:
    # F0 (on Front) → F7, piece 2 (new body, symmetric)
    with BuildSketch(Plane.XZ):
        with BuildLine():
            ThreePointArc((-87.3586775133, -28.7995953113), (-75.9392231703, -40.2190496543), (-64.5197688273, -28.7995953113))
            ThreePointArc((-64.5197688273, -28.7995953113), (-75.9392231703, -17.3801409683), (-87.3586775133, -28.7995953113))
        make_face()
    extrude(amount=F7_DEPTH, both=True)


with BuildPart() as f7c:
    # F0 (on Front) → F7, piece 3 (new body, symmetric)
    with BuildSketch(Plane.XZ):
        with BuildLine():
            ThreePointArc((-29.8456347218, -28.7995953113), (-41.2650890648, -17.3801409683), (-52.6845434078, -28.7995953113))
            ThreePointArc((-52.6845434078, -28.7995953113), (-41.2650890648, -40.2190496543), (-29.8456347218, -28.7995953113))
        make_face()
    extrude(amount=F7_DEPTH, both=True)


with BuildPart() as f7d:
    # F0 (on Front) → F7, piece 4 (new body, symmetric)
    with BuildSketch(Plane.XZ):
        with BuildLine():
            ThreePointArc((-2.0490142188, -28.7995953113), (-13.4684685618, -17.3801409683), (-24.8879229048, -28.7995953113))
            ThreePointArc((-24.8879229048, -28.7995953113), (-13.4684685618, -40.2190496543), (-2.0490142188, -28.7995953113))
        make_face()
    extrude(amount=F7_DEPTH, both=True)


with BuildPart() as f7e:
    # F0 (on Front) → F7, piece 5 (new body, symmetric)
    with BuildSketch(Plane.XZ):
        with BuildLine():
            ThreePointArc((24.6013540172, -28.7995953113), (13.1818996742, -17.3801409683), (1.7624453312, -28.7995953113))
            ThreePointArc((1.7624453312, -28.7995953113), (13.1818996742, -40.2190496543), (24.6013540172, -28.7995953113))
        make_face()
    extrude(amount=F7_DEPTH, both=True)


with BuildPart() as f7f:
    # F0 (on Front) → F7, piece 6 (new body, symmetric)
    with BuildSketch(Plane.XZ):
        with BuildLine():
            ThreePointArc((32.9978263608, -28.7995953113), (44.4172807038, -40.2190496543), (55.8367350468, -28.7995953113))
            ThreePointArc((55.8367350468, -28.7995953113), (44.4172807038, -17.3801409683), (32.9978263608, -28.7995953113))
        make_face()
    extrude(amount=F7_DEPTH, both=True)


with BuildPart() as f7g:
    # F0 (on Front) → F7, piece 7 (new body, symmetric)
    with BuildSketch(Plane.XZ):
        with BuildLine():
            ThreePointArc((60.2213128141, -28.7995953113), (71.6407671571, -40.2190496543), (83.0602215001, -28.7995953113))
            ThreePointArc((83.0602215001, -28.7995953113), (71.6407671571, -17.3801409683), (60.2213128141, -28.7995953113))
        make_face()
    extrude(amount=F7_DEPTH, both=True)


with BuildPart() as f7h:
    # F0 (on Front) → F7, piece 8 (new body, symmetric)
    with BuildSketch(Plane.XZ):
        with BuildLine():
            ThreePointArc((89.1641883782, -28.7995953113), (100.5836427212, -40.2190496543), (112.0030970642, -28.7995953113))
            ThreePointArc((112.0030970642, -28.7995953113), (100.5836427212, -17.3801409683), (89.1641883782, -28.7995953113))
        make_face()
    extrude(amount=F7_DEPTH, both=True)


solid = Compound([f1_2.part, f7.part, f7b.part, f7c.part, f7d.part, f7e.part, f7f.part, f7g.part, f7h.part])
